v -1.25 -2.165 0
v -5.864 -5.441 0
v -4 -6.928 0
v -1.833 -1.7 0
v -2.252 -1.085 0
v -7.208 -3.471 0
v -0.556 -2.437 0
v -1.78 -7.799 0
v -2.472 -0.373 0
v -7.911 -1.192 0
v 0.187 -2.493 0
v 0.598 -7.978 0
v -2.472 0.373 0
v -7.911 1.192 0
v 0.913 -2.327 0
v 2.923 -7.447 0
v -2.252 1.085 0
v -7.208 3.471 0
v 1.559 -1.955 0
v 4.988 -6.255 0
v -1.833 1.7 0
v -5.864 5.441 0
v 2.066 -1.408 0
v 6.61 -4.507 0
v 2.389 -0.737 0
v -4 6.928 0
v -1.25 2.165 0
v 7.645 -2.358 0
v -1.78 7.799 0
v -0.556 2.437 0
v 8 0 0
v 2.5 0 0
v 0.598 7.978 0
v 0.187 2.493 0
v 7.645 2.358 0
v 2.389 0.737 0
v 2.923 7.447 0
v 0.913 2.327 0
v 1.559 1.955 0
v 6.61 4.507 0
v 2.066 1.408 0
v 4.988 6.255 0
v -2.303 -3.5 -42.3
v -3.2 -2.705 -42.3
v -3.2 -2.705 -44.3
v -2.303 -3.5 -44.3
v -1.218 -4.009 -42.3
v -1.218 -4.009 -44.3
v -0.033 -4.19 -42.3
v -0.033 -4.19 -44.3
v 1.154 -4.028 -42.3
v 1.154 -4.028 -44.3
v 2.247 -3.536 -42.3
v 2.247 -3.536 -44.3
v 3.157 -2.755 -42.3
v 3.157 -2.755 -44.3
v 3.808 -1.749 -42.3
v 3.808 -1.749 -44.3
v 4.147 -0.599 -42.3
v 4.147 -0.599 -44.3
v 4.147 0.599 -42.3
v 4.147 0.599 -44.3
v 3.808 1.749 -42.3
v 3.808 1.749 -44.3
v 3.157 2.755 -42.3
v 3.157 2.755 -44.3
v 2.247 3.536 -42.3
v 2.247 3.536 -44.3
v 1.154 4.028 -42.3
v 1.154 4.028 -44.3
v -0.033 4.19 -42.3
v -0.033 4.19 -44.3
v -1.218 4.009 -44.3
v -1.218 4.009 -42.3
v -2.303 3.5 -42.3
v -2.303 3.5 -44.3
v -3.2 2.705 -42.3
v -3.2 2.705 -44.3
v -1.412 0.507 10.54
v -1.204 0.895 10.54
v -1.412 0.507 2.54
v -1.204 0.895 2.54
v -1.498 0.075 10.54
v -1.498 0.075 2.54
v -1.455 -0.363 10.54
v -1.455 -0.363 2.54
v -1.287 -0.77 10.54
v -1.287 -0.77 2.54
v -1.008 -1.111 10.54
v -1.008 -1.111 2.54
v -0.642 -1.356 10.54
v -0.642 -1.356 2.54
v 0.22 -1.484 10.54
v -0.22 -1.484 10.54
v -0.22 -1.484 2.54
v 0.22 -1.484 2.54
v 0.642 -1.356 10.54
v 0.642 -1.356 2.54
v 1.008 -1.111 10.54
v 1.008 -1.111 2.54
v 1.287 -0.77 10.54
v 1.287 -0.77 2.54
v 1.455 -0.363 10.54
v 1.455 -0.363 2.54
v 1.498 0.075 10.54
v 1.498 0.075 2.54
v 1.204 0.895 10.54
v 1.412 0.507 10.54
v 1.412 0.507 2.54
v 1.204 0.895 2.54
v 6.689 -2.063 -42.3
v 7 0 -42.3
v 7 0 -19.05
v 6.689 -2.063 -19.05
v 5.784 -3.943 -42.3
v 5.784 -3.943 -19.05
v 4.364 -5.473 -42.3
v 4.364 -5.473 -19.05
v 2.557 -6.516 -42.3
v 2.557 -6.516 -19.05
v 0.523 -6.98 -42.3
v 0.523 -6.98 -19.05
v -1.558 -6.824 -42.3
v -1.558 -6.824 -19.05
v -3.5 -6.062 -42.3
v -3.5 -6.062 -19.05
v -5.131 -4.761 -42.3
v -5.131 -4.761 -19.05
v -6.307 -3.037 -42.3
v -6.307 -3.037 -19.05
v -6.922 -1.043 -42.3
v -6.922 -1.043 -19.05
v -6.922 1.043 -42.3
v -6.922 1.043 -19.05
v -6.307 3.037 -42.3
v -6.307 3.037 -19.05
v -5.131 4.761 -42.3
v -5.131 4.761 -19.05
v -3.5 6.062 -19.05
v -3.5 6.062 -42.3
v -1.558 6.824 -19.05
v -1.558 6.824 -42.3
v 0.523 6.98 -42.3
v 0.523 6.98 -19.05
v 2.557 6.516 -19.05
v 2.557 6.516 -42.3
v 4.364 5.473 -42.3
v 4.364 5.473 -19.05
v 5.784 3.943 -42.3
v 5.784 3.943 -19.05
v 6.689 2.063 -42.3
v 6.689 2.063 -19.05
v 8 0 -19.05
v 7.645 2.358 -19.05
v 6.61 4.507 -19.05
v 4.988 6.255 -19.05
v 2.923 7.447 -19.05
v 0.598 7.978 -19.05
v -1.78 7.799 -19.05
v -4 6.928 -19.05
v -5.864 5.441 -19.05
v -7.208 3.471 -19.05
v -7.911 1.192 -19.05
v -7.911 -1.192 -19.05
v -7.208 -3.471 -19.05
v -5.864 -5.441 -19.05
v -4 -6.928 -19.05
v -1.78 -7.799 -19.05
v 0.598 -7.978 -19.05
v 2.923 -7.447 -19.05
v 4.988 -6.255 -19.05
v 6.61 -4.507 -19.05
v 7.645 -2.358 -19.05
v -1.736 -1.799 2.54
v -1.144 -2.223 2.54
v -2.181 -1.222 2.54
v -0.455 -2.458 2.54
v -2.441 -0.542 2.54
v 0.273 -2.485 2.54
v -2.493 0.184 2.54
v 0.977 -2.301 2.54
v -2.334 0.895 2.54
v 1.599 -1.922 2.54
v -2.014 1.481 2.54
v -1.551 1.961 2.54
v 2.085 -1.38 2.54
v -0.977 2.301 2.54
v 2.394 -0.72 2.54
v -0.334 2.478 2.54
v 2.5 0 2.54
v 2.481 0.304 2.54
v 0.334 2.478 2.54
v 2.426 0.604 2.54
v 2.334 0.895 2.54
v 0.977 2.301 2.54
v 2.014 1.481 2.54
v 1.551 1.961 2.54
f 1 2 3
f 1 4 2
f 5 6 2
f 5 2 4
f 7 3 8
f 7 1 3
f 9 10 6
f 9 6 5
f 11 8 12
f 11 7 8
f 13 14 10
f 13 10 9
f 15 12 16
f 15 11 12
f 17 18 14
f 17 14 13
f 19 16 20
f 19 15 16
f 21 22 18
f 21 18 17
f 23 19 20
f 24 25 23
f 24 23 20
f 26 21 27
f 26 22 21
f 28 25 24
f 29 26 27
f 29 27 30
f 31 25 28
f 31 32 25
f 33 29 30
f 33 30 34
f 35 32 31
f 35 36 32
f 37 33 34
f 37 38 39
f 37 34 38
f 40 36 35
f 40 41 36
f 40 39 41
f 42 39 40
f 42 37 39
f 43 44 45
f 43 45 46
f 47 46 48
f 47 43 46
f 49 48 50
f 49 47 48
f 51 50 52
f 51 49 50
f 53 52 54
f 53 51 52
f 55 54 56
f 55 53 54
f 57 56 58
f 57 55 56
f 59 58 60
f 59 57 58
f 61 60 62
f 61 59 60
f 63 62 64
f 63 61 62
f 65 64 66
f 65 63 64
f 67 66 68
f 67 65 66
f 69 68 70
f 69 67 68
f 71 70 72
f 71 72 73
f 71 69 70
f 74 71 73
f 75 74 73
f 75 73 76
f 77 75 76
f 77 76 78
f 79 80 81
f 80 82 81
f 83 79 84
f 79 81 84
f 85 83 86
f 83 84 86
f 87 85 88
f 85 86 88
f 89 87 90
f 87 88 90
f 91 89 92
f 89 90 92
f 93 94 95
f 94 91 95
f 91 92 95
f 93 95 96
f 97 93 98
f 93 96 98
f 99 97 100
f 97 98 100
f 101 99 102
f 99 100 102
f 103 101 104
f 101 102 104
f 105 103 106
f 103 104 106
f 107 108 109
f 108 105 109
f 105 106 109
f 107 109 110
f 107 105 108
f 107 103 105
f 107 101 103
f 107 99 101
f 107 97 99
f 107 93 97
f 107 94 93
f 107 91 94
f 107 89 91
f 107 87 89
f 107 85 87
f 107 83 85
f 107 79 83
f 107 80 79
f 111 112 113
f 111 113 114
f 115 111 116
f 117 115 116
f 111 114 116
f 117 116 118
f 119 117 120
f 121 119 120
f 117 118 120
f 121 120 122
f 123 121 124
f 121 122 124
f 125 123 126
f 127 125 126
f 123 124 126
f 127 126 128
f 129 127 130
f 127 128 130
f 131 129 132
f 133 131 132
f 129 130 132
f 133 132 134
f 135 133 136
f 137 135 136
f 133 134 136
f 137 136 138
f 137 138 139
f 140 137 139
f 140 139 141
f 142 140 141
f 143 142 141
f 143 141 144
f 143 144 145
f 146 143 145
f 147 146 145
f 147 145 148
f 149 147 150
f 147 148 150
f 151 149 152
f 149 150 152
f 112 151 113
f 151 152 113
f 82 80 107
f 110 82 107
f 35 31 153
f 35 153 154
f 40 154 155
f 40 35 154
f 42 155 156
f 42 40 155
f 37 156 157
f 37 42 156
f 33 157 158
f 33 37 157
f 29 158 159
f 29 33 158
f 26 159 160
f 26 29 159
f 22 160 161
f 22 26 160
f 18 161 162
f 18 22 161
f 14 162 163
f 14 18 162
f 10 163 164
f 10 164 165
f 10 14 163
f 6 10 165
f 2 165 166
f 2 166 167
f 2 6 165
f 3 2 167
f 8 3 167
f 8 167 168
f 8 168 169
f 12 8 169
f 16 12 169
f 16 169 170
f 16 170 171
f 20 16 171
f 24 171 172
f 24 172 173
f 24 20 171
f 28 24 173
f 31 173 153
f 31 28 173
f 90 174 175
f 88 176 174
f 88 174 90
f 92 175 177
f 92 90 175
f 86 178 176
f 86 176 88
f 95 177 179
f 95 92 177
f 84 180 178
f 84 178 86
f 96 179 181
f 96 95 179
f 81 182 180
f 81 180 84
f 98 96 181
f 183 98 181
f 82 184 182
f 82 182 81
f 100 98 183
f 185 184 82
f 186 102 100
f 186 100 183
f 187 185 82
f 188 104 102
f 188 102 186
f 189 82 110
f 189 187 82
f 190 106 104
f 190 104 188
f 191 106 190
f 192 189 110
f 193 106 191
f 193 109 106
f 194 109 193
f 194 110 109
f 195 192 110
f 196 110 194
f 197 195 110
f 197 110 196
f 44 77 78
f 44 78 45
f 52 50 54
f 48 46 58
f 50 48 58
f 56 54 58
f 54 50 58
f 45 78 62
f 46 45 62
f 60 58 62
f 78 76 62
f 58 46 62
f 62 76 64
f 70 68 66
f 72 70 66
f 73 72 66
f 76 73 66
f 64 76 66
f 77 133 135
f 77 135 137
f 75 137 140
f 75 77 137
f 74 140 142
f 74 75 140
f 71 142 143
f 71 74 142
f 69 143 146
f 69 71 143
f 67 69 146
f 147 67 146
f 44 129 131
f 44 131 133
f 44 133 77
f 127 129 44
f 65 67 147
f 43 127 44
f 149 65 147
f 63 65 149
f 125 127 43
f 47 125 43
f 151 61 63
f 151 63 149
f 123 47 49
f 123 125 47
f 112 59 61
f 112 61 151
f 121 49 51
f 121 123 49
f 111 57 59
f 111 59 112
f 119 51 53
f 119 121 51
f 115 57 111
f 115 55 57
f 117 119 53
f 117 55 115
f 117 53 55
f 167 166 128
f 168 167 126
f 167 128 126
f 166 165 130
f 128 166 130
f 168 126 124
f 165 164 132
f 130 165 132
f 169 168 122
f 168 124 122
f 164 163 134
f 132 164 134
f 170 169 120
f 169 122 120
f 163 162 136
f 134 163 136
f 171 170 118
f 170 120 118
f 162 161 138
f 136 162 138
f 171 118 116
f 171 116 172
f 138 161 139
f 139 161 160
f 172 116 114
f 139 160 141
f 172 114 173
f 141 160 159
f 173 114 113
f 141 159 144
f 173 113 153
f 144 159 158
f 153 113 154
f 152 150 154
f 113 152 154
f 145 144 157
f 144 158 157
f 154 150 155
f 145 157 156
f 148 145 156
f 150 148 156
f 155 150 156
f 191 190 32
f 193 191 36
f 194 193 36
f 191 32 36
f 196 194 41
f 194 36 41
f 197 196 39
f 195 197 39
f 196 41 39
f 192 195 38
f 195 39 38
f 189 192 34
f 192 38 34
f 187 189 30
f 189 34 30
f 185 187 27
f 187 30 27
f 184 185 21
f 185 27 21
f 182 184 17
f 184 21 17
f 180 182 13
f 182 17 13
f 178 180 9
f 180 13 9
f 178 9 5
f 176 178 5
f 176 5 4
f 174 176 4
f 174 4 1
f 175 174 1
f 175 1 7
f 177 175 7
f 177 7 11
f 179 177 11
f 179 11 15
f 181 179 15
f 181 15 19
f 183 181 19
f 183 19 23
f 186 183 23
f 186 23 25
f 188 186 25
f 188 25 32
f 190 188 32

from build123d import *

# Parameters (mm, degrees)
SKETCH2_R           = 8
BASE_EXTRUDE_DEPTH  = 19.05
SKETCH3_R           = 2.5
BOSS_EXTRUDE1_DEPTH = 2.54
SKETCH5_R           = 1.5
BOSS_EXTRUDE2_DEPTH = 8
CUT_EXTRUDE1_START  = -8
CUT_EXTRUDE1_DEPTH  = 8
SKETCH7_R           = 7
BOSS_EXTRUDE3_DEPTH = 23.25
BOSS_EXTRUDE4_DEPTH = 2


with BuildPart() as part:
    # Sketch2 → Base-Extrude (new body)
    with BuildSketch(Plane.XY):
        Circle(SKETCH2_R)
    extrude(amount=-BASE_EXTRUDE_DEPTH)

    # Sketch3 → Boss-Extrude1 (add)
    with BuildSketch(Plane.XY):
        Circle(SKETCH3_R)
    extrude(amount=BOSS_EXTRUDE1_DEPTH)

    # Sketch5 → Boss-Extrude2 (add)
    with BuildSketch(Plane.XY.offset(2.54)):
        Circle(SKETCH5_R)
    extrude(amount=BOSS_EXTRUDE2_DEPTH)

    # Sketch6 → Cut-Extrude1 (cut)
    with BuildSketch(Plane.XY.offset(10.54).offset(CUT_EXTRUDE1_START)):
        with BuildLine():
            Line((-2.334314707, 0.894971982), (2.334314707, 0.894971982))
            ThreePointArc((2.334314707, 0.894971982), (0, 2.5), (-2.334314707, 0.894971982))
        make_face()
    extrude(amount=CUT_EXTRUDE1_DEPTH, mode=Mode.SUBTRACT)

    # Sketch7 → Boss-Extrude3 (add)
    with BuildSketch(Plane(origin=(0, 0, -19.05), x_dir=(-1, 0, 0), z_dir=(0, 0, -1))):
        with Locations(Location((0, 0, 0), (0, 0, 180))):
            Circle(SKETCH7_R)
    extrude(amount=BOSS_EXTRUDE3_DEPTH)

    # Sketch8 → Boss-Extrude4 (add)
    with BuildSketch(Plane(origin=(0, 0, -42.3), x_dir=(-1, 0, 0), z_dir=(0, 0, -1))):
        with BuildLine():
            Line((3.2, 2.704829015), (3.2, -2.704829015))
            ThreePointArc((3.2, -2.704829015), (-4.19, 0), (3.2, 2.704829015))
        make_face()
    extrude(amount=BOSS_EXTRUDE4_DEPTH)


solid = part.part
